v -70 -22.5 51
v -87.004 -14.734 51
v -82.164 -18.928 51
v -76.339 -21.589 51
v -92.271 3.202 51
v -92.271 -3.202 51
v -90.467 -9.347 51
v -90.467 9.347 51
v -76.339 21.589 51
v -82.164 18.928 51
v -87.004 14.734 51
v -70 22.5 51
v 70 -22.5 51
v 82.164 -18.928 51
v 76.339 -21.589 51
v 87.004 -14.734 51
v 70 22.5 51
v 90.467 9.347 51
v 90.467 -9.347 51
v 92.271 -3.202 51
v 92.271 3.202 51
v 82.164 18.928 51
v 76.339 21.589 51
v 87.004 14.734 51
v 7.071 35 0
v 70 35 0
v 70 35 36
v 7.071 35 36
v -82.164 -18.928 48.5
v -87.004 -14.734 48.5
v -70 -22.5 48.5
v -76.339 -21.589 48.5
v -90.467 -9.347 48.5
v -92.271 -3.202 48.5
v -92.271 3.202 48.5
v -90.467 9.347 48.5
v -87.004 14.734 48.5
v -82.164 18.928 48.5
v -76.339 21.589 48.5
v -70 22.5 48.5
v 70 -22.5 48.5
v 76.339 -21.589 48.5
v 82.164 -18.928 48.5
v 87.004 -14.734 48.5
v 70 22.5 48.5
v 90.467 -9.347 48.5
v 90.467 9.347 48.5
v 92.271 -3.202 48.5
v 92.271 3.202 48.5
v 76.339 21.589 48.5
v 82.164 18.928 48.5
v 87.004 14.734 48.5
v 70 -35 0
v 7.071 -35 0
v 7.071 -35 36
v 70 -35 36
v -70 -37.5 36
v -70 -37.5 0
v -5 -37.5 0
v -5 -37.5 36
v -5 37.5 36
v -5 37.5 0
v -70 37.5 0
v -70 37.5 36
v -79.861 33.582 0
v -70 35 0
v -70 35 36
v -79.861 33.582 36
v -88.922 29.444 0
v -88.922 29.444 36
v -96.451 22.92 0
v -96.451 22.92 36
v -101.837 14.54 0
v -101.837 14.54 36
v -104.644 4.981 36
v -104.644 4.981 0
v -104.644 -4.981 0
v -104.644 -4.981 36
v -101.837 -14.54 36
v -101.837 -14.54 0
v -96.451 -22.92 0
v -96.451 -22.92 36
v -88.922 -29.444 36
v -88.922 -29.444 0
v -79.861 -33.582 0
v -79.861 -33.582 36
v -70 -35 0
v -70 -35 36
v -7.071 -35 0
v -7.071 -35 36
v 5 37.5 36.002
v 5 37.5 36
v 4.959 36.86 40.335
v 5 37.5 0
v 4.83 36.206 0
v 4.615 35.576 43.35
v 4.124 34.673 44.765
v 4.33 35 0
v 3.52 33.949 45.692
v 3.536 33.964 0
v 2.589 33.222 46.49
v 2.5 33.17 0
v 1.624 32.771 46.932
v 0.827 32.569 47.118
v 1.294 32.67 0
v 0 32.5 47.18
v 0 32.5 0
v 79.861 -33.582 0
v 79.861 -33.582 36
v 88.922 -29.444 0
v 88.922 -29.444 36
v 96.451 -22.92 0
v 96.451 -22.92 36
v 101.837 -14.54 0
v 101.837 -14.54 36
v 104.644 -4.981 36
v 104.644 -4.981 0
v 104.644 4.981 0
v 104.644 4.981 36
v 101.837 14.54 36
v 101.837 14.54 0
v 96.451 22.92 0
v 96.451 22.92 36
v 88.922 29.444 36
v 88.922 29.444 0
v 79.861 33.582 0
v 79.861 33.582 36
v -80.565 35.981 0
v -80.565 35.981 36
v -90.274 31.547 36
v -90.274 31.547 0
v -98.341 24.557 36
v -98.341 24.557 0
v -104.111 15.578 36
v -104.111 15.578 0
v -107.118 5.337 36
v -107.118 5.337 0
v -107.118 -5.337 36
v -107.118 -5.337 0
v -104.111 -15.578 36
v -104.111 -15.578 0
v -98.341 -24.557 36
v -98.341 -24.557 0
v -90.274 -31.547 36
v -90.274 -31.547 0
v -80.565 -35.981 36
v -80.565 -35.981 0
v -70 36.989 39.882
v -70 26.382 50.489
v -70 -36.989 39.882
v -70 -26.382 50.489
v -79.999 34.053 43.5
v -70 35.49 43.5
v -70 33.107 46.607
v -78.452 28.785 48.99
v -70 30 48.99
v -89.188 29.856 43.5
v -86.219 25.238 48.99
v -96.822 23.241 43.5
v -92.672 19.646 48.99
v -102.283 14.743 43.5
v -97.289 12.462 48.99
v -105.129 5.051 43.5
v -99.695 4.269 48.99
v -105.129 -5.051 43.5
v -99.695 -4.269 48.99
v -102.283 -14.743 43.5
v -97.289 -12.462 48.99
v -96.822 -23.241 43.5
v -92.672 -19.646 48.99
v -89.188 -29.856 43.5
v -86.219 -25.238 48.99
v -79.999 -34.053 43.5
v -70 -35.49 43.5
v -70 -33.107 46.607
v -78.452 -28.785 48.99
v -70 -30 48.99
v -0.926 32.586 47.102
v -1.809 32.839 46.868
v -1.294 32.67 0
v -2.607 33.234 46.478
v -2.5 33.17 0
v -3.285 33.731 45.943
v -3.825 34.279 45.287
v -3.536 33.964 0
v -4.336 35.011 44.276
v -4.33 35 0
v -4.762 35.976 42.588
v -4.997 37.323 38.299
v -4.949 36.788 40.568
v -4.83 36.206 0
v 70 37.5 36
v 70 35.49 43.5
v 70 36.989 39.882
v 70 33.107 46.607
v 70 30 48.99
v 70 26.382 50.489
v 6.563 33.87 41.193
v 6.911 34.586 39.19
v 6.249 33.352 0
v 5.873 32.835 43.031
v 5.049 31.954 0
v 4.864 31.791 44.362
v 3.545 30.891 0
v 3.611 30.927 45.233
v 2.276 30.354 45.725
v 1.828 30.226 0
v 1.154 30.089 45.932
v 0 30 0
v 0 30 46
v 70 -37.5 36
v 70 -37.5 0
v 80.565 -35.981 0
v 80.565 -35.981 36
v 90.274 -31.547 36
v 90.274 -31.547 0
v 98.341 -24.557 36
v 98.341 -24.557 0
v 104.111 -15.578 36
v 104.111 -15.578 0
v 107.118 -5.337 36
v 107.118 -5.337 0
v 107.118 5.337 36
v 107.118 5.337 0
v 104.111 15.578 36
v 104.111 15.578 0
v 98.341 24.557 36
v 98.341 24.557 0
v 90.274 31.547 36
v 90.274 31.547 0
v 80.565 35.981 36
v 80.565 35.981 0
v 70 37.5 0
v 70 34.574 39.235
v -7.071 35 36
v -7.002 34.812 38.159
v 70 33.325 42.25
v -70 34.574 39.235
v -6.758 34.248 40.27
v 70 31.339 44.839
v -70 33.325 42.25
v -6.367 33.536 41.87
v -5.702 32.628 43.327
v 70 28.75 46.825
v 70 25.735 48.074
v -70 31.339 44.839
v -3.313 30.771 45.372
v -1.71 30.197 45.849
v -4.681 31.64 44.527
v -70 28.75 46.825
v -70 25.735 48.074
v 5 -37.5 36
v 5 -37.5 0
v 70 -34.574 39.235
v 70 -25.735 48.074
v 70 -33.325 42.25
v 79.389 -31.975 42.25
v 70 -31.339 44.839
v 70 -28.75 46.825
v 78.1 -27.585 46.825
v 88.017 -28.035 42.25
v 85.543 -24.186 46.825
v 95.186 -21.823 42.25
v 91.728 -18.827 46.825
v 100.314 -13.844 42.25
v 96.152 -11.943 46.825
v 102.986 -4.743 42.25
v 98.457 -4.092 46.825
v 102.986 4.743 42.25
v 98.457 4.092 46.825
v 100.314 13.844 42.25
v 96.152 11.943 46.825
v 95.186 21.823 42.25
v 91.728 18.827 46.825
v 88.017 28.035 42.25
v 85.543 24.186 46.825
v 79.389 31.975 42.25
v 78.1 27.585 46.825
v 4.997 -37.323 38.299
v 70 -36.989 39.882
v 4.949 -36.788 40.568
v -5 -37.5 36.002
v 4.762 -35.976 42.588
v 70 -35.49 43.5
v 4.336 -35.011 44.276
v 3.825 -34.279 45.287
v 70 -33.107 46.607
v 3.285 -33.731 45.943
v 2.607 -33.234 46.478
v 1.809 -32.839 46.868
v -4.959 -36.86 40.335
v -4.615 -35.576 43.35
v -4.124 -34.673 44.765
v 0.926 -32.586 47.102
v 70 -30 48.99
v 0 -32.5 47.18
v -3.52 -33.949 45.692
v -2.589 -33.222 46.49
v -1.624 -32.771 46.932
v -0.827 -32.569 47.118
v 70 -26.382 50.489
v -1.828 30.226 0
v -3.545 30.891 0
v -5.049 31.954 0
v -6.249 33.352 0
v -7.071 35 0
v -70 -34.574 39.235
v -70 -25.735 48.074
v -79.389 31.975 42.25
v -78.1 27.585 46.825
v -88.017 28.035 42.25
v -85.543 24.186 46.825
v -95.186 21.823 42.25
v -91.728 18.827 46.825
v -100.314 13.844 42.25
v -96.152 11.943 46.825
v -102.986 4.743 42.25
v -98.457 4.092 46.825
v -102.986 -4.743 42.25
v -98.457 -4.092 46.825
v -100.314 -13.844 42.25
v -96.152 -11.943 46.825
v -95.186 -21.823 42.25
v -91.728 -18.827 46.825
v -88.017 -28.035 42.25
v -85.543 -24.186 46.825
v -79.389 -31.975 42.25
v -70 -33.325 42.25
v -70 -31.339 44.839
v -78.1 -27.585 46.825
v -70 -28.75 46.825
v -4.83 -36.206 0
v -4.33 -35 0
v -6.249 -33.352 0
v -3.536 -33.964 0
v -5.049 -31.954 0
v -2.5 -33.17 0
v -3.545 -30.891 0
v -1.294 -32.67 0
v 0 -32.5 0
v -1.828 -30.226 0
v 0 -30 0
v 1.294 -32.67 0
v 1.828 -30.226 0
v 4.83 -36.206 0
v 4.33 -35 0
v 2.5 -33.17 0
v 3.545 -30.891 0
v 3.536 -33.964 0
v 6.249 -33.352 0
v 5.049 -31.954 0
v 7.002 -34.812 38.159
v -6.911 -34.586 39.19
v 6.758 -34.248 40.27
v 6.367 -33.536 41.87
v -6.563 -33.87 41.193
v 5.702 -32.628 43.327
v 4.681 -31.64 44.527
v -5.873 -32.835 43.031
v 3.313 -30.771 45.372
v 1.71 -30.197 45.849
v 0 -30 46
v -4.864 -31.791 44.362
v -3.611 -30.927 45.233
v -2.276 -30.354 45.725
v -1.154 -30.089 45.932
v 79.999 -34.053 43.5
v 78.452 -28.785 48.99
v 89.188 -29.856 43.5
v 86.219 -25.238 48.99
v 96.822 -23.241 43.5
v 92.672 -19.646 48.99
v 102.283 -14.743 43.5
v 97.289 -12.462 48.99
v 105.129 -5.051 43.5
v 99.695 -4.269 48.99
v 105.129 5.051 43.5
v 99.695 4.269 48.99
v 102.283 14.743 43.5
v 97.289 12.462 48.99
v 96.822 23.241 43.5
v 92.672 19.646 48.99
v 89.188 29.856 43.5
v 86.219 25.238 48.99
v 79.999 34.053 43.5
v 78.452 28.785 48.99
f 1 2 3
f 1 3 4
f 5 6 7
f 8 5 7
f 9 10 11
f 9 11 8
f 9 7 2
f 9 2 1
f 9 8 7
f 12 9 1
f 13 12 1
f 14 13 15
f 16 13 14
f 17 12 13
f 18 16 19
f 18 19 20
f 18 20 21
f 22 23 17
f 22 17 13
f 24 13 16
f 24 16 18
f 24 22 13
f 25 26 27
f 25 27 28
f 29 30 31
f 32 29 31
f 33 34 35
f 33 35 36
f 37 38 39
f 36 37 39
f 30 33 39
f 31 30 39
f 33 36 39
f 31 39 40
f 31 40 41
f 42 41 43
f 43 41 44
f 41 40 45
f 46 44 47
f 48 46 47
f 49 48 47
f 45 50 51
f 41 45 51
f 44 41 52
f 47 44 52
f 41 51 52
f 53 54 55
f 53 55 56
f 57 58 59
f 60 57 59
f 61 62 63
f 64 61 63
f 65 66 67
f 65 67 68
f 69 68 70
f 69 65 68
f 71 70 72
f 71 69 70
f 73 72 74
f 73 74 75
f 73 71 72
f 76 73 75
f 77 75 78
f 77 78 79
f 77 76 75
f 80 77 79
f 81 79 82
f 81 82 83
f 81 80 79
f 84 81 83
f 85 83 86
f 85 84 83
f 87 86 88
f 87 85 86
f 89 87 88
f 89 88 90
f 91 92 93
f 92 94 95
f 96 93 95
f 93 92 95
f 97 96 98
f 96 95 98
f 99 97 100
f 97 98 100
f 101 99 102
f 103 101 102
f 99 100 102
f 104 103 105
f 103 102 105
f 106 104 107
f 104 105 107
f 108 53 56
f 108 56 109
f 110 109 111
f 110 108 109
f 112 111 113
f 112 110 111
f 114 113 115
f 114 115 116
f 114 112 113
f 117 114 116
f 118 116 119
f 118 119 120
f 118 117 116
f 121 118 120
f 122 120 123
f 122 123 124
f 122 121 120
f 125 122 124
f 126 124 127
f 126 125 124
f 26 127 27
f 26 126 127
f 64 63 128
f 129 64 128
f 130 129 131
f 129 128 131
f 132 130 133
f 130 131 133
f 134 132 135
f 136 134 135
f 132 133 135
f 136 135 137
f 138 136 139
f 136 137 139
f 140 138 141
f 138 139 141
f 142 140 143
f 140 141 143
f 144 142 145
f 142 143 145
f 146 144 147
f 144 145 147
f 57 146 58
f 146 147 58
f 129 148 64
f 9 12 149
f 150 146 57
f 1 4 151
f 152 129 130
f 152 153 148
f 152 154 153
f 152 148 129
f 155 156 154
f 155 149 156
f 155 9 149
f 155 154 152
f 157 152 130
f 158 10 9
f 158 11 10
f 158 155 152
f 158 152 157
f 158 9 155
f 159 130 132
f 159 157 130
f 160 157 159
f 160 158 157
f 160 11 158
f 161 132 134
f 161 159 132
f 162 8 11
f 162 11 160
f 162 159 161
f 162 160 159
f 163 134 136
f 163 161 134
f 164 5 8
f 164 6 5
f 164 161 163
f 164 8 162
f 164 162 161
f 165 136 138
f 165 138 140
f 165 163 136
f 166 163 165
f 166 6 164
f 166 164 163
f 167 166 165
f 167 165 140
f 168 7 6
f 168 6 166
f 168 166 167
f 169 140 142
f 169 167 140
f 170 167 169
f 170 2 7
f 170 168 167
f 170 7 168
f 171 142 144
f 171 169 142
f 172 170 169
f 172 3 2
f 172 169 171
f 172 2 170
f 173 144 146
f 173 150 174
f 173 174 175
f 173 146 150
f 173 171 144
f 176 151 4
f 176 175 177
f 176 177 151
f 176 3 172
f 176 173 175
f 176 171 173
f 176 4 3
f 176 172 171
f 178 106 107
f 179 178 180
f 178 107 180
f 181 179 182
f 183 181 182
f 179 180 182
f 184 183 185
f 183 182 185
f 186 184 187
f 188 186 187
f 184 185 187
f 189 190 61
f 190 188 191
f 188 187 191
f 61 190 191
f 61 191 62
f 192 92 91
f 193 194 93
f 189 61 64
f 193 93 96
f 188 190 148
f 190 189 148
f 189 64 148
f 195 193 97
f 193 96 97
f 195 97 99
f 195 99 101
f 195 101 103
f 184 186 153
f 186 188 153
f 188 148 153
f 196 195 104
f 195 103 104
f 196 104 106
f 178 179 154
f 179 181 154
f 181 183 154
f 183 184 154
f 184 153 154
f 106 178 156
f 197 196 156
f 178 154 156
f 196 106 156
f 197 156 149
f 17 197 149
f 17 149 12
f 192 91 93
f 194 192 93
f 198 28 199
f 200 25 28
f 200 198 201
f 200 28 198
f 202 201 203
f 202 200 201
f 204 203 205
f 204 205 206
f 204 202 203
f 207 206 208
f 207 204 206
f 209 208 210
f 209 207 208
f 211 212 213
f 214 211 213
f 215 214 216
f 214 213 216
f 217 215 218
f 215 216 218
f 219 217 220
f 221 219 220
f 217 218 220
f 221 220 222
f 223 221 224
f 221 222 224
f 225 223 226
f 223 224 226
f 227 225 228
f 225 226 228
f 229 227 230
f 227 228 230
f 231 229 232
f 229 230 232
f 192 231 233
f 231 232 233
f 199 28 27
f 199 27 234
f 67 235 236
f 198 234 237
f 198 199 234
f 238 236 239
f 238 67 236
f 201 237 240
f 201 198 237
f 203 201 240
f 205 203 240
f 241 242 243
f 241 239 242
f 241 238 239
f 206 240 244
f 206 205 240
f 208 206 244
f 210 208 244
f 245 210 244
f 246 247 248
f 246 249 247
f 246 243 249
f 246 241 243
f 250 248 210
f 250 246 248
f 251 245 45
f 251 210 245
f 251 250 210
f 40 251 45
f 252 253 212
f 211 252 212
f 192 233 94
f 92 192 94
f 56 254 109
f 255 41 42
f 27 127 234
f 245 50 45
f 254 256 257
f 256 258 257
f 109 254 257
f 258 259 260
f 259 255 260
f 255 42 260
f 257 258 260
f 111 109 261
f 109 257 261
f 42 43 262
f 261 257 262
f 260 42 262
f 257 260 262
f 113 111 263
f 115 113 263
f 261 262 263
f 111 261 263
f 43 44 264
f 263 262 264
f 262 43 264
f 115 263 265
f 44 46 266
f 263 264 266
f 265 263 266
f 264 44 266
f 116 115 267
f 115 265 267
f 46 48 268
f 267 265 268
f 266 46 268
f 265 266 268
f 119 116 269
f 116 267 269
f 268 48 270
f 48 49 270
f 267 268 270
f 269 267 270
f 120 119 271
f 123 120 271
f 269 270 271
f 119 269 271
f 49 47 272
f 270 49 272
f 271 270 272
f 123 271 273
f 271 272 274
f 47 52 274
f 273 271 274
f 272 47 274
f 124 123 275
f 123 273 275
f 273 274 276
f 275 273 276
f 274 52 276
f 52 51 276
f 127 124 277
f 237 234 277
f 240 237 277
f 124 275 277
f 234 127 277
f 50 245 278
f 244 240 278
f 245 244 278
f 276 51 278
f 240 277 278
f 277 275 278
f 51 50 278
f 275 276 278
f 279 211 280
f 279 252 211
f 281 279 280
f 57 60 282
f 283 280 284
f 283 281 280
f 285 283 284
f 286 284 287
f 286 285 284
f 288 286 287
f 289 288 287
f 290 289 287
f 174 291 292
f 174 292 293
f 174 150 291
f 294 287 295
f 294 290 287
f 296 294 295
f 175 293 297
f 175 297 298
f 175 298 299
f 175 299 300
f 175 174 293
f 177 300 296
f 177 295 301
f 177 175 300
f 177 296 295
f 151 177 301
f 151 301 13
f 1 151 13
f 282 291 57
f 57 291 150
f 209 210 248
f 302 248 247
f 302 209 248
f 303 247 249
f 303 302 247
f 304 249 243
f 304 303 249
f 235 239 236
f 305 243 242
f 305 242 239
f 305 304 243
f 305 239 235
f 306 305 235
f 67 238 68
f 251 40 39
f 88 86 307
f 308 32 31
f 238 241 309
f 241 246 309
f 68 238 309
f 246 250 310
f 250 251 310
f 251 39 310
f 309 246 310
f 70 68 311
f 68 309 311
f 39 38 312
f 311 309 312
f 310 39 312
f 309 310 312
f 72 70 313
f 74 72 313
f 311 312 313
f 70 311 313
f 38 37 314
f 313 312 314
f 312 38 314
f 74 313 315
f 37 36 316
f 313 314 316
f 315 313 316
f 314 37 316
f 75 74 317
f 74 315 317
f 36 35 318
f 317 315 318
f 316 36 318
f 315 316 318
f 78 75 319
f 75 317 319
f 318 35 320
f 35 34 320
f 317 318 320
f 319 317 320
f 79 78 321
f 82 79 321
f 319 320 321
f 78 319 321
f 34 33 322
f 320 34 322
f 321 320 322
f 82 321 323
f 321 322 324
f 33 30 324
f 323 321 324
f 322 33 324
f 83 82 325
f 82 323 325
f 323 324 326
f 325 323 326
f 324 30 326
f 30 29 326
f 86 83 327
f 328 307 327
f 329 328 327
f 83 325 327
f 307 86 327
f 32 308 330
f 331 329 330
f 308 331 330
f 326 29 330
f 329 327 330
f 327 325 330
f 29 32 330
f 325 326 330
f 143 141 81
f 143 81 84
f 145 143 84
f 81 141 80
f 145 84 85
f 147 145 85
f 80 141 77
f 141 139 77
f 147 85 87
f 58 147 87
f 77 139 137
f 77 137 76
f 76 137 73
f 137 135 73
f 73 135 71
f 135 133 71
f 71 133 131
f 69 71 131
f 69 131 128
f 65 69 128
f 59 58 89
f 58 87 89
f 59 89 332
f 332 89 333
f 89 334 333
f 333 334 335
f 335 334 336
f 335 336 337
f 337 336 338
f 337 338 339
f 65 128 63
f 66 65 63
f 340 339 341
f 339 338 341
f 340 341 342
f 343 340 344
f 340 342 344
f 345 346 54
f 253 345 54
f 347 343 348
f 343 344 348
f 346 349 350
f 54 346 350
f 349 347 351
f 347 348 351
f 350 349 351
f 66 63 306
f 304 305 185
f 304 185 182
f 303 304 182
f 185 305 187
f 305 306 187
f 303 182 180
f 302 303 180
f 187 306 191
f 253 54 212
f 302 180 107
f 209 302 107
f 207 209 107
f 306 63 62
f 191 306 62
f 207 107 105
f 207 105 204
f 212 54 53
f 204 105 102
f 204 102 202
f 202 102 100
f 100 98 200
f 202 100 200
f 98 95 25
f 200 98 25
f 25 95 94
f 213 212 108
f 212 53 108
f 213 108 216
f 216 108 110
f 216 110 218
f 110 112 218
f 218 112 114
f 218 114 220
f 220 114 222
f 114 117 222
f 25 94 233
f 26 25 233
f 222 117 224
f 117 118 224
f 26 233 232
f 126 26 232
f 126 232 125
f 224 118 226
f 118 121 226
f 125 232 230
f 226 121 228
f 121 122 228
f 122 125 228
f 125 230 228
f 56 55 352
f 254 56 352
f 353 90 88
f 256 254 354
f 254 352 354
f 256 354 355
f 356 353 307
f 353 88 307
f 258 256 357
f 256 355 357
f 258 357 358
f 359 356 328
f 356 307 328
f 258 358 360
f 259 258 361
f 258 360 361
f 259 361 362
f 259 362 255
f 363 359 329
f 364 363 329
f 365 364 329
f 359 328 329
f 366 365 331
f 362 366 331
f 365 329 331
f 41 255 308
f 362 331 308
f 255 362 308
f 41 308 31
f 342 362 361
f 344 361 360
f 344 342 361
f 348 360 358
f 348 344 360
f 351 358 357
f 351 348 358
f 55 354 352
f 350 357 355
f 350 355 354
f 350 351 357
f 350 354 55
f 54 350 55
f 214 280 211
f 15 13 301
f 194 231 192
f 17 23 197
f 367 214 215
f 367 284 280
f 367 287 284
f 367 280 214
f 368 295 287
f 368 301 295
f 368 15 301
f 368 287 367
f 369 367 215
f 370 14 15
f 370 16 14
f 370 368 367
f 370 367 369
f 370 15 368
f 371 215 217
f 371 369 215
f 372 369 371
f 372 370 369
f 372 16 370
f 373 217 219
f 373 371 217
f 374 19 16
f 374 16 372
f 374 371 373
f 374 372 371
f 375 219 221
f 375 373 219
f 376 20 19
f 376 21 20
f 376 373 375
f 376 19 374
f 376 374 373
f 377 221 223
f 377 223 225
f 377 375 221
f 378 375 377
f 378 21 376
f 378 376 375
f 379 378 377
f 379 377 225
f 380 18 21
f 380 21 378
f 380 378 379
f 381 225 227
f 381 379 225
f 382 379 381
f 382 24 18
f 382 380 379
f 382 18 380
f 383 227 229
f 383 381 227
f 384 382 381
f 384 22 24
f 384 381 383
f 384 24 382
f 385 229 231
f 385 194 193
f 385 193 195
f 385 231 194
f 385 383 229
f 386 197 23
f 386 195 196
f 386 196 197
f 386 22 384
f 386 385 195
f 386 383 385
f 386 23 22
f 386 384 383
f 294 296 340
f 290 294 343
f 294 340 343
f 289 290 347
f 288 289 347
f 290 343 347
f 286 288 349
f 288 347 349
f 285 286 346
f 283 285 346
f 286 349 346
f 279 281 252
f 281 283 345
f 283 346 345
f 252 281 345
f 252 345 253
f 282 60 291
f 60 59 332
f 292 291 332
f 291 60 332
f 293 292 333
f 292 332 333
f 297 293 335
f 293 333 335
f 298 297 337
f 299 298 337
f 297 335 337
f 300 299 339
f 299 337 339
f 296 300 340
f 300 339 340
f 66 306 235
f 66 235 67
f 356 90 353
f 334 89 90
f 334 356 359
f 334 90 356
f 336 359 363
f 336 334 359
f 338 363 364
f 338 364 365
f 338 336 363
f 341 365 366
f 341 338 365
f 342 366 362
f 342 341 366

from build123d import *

# Parameters (mm, degrees)
F1_DEPTH    = 51
F2_T1_DEPTH = 102.5
F2_T3_DEPTH = 102.5
F2_T6_ANGLE = 180
F2_T8_ANGLE = 180
F3_T        = -2.5


# Not quite as in the source:
# - a fillet or chamfer that OpenCascade refuses, or shapes differently, is made with other operations: its cross-section is extruded or revolved along the edge and cut away or added


with BuildPart() as f1:
    # F0 (on Top) → F1 (new body)
    with BuildSketch(Plane.XY):
        with BuildLine():
            Line((-70, 37.5), (-70, -37.5))
            Line((-70, -37.5), (-5, -37.5))
            ThreePointArc((-5, -37.5), (-3.5355339059, -33.9644660941), (0, -32.5))
            Line((0, -32.5), (0, 0))
            Line((0, 0), (0, 32.5))
            ThreePointArc((0, 32.5), (-3.5355339059, 33.9644660941), (-5, 37.5))
            Line((-5, 37.5), (-70, 37.5))
        make_face()
        with BuildLine():
            ThreePointArc((-70, 37.5), (-107.5, 0), (-70, -37.5))
            Line((-70, -37.5), (-70, 37.5))
        make_face()
        with BuildLine():
            Line((0, 0), (0, -32.5))
            ThreePointArc((0, -32.5), (3.5355339059, -33.9644660941), (5, -37.5))
            Line((5, -37.5), (70, -37.5))
            Line((70, -37.5), (70, 37.5))
            Line((70, 37.5), (5, 37.5))
            ThreePointArc((5, 37.5), (3.5355339059, 33.9644660941), (0, 32.5))
            Line((0, 32.5), (0, 0))
        make_face()
        with BuildLine():
            Line((70, 37.5), (70, -37.5))
            ThreePointArc((70, -37.5), (107.5, 0), (70, 37.5))
        make_face()
    extrude(amount=F1_DEPTH)

    # F2: fillet of radius 15 on 6 edges, made by hand

    # F2_s2 → F2_t1 (cut)
    with BuildSketch(Plane.YZ.offset(-32.5)):
        with BuildLine():
            ThreePointArc((-37.5, 36), (-33.1066017178, 46.6066017178), (-22.5, 51))
            Line((-22.5, 51), (-37.5, 51))
            Line((-37.5, 51), (-37.5, 36))
        make_face()
        with BuildLine():
            ThreePointArc((37.5, 36), (33.1066017178, 46.6066017178), (22.5, 51))
            Line((22.5, 51), (37.5, 51))
            Line((37.5, 51), (37.5, 36))
        make_face()
    extrude(amount=F2_T1_DEPTH, mode=Mode.SUBTRACT)

    # F2_s4 → F2_t3 (cut)
    with BuildSketch(Plane.YZ.offset(-70)):
        with BuildLine():
            ThreePointArc((37.5, 36), (33.1066017178, 46.6066017178), (22.5, 51))
            Line((22.5, 51), (37.5, 51))
            Line((37.5, 51), (37.5, 36))
        make_face()
        with BuildLine():
            ThreePointArc((-37.5, 36), (-33.1066017178, 46.6066017178), (-22.5, 51))
            Line((-22.5, 51), (-37.5, 51))
            Line((-37.5, 51), (-37.5, 36))
        make_face()
    extrude(amount=F2_T3_DEPTH, mode=Mode.SUBTRACT)

    # F2_s5 → F2_t6 (revolve, cut)
    with BuildSketch(Plane.YZ.offset(70)):
        with BuildLine():
            ThreePointArc((-37.5, 36), (-33.1066017178, 46.6066017178), (-22.5, 51))
            Line((-22.5, 51), (-37.5, 51))
            Line((-37.5, 51), (-37.5, 36))
        make_face()
    revolve(axis=Axis((70, 0, 51), (0, 0, 1)), revolution_arc=F2_T6_ANGLE, mode=Mode.SUBTRACT)

    # F2_s7 → F2_t8 (revolve, cut)
    with BuildSketch(Plane.YZ.offset(-70)):
        with BuildLine():
            ThreePointArc((37.5, 36), (33.1066017178, 46.6066017178), (22.5, 51))
            Line((22.5, 51), (37.5, 51))
            Line((37.5, 51), (37.5, 36))
        make_face()
    revolve(axis=Axis((-70, 0, 51), (0, 0, 1)), revolution_arc=F2_T8_ANGLE, mode=Mode.SUBTRACT)

    # F3
    f3_openings = [f1.faces().sort_by_distance(p)[0] for p in [
        (0, 0, 0),
    ]]
    offset(amount=F3_T, openings=f3_openings)


solid = f1.part
